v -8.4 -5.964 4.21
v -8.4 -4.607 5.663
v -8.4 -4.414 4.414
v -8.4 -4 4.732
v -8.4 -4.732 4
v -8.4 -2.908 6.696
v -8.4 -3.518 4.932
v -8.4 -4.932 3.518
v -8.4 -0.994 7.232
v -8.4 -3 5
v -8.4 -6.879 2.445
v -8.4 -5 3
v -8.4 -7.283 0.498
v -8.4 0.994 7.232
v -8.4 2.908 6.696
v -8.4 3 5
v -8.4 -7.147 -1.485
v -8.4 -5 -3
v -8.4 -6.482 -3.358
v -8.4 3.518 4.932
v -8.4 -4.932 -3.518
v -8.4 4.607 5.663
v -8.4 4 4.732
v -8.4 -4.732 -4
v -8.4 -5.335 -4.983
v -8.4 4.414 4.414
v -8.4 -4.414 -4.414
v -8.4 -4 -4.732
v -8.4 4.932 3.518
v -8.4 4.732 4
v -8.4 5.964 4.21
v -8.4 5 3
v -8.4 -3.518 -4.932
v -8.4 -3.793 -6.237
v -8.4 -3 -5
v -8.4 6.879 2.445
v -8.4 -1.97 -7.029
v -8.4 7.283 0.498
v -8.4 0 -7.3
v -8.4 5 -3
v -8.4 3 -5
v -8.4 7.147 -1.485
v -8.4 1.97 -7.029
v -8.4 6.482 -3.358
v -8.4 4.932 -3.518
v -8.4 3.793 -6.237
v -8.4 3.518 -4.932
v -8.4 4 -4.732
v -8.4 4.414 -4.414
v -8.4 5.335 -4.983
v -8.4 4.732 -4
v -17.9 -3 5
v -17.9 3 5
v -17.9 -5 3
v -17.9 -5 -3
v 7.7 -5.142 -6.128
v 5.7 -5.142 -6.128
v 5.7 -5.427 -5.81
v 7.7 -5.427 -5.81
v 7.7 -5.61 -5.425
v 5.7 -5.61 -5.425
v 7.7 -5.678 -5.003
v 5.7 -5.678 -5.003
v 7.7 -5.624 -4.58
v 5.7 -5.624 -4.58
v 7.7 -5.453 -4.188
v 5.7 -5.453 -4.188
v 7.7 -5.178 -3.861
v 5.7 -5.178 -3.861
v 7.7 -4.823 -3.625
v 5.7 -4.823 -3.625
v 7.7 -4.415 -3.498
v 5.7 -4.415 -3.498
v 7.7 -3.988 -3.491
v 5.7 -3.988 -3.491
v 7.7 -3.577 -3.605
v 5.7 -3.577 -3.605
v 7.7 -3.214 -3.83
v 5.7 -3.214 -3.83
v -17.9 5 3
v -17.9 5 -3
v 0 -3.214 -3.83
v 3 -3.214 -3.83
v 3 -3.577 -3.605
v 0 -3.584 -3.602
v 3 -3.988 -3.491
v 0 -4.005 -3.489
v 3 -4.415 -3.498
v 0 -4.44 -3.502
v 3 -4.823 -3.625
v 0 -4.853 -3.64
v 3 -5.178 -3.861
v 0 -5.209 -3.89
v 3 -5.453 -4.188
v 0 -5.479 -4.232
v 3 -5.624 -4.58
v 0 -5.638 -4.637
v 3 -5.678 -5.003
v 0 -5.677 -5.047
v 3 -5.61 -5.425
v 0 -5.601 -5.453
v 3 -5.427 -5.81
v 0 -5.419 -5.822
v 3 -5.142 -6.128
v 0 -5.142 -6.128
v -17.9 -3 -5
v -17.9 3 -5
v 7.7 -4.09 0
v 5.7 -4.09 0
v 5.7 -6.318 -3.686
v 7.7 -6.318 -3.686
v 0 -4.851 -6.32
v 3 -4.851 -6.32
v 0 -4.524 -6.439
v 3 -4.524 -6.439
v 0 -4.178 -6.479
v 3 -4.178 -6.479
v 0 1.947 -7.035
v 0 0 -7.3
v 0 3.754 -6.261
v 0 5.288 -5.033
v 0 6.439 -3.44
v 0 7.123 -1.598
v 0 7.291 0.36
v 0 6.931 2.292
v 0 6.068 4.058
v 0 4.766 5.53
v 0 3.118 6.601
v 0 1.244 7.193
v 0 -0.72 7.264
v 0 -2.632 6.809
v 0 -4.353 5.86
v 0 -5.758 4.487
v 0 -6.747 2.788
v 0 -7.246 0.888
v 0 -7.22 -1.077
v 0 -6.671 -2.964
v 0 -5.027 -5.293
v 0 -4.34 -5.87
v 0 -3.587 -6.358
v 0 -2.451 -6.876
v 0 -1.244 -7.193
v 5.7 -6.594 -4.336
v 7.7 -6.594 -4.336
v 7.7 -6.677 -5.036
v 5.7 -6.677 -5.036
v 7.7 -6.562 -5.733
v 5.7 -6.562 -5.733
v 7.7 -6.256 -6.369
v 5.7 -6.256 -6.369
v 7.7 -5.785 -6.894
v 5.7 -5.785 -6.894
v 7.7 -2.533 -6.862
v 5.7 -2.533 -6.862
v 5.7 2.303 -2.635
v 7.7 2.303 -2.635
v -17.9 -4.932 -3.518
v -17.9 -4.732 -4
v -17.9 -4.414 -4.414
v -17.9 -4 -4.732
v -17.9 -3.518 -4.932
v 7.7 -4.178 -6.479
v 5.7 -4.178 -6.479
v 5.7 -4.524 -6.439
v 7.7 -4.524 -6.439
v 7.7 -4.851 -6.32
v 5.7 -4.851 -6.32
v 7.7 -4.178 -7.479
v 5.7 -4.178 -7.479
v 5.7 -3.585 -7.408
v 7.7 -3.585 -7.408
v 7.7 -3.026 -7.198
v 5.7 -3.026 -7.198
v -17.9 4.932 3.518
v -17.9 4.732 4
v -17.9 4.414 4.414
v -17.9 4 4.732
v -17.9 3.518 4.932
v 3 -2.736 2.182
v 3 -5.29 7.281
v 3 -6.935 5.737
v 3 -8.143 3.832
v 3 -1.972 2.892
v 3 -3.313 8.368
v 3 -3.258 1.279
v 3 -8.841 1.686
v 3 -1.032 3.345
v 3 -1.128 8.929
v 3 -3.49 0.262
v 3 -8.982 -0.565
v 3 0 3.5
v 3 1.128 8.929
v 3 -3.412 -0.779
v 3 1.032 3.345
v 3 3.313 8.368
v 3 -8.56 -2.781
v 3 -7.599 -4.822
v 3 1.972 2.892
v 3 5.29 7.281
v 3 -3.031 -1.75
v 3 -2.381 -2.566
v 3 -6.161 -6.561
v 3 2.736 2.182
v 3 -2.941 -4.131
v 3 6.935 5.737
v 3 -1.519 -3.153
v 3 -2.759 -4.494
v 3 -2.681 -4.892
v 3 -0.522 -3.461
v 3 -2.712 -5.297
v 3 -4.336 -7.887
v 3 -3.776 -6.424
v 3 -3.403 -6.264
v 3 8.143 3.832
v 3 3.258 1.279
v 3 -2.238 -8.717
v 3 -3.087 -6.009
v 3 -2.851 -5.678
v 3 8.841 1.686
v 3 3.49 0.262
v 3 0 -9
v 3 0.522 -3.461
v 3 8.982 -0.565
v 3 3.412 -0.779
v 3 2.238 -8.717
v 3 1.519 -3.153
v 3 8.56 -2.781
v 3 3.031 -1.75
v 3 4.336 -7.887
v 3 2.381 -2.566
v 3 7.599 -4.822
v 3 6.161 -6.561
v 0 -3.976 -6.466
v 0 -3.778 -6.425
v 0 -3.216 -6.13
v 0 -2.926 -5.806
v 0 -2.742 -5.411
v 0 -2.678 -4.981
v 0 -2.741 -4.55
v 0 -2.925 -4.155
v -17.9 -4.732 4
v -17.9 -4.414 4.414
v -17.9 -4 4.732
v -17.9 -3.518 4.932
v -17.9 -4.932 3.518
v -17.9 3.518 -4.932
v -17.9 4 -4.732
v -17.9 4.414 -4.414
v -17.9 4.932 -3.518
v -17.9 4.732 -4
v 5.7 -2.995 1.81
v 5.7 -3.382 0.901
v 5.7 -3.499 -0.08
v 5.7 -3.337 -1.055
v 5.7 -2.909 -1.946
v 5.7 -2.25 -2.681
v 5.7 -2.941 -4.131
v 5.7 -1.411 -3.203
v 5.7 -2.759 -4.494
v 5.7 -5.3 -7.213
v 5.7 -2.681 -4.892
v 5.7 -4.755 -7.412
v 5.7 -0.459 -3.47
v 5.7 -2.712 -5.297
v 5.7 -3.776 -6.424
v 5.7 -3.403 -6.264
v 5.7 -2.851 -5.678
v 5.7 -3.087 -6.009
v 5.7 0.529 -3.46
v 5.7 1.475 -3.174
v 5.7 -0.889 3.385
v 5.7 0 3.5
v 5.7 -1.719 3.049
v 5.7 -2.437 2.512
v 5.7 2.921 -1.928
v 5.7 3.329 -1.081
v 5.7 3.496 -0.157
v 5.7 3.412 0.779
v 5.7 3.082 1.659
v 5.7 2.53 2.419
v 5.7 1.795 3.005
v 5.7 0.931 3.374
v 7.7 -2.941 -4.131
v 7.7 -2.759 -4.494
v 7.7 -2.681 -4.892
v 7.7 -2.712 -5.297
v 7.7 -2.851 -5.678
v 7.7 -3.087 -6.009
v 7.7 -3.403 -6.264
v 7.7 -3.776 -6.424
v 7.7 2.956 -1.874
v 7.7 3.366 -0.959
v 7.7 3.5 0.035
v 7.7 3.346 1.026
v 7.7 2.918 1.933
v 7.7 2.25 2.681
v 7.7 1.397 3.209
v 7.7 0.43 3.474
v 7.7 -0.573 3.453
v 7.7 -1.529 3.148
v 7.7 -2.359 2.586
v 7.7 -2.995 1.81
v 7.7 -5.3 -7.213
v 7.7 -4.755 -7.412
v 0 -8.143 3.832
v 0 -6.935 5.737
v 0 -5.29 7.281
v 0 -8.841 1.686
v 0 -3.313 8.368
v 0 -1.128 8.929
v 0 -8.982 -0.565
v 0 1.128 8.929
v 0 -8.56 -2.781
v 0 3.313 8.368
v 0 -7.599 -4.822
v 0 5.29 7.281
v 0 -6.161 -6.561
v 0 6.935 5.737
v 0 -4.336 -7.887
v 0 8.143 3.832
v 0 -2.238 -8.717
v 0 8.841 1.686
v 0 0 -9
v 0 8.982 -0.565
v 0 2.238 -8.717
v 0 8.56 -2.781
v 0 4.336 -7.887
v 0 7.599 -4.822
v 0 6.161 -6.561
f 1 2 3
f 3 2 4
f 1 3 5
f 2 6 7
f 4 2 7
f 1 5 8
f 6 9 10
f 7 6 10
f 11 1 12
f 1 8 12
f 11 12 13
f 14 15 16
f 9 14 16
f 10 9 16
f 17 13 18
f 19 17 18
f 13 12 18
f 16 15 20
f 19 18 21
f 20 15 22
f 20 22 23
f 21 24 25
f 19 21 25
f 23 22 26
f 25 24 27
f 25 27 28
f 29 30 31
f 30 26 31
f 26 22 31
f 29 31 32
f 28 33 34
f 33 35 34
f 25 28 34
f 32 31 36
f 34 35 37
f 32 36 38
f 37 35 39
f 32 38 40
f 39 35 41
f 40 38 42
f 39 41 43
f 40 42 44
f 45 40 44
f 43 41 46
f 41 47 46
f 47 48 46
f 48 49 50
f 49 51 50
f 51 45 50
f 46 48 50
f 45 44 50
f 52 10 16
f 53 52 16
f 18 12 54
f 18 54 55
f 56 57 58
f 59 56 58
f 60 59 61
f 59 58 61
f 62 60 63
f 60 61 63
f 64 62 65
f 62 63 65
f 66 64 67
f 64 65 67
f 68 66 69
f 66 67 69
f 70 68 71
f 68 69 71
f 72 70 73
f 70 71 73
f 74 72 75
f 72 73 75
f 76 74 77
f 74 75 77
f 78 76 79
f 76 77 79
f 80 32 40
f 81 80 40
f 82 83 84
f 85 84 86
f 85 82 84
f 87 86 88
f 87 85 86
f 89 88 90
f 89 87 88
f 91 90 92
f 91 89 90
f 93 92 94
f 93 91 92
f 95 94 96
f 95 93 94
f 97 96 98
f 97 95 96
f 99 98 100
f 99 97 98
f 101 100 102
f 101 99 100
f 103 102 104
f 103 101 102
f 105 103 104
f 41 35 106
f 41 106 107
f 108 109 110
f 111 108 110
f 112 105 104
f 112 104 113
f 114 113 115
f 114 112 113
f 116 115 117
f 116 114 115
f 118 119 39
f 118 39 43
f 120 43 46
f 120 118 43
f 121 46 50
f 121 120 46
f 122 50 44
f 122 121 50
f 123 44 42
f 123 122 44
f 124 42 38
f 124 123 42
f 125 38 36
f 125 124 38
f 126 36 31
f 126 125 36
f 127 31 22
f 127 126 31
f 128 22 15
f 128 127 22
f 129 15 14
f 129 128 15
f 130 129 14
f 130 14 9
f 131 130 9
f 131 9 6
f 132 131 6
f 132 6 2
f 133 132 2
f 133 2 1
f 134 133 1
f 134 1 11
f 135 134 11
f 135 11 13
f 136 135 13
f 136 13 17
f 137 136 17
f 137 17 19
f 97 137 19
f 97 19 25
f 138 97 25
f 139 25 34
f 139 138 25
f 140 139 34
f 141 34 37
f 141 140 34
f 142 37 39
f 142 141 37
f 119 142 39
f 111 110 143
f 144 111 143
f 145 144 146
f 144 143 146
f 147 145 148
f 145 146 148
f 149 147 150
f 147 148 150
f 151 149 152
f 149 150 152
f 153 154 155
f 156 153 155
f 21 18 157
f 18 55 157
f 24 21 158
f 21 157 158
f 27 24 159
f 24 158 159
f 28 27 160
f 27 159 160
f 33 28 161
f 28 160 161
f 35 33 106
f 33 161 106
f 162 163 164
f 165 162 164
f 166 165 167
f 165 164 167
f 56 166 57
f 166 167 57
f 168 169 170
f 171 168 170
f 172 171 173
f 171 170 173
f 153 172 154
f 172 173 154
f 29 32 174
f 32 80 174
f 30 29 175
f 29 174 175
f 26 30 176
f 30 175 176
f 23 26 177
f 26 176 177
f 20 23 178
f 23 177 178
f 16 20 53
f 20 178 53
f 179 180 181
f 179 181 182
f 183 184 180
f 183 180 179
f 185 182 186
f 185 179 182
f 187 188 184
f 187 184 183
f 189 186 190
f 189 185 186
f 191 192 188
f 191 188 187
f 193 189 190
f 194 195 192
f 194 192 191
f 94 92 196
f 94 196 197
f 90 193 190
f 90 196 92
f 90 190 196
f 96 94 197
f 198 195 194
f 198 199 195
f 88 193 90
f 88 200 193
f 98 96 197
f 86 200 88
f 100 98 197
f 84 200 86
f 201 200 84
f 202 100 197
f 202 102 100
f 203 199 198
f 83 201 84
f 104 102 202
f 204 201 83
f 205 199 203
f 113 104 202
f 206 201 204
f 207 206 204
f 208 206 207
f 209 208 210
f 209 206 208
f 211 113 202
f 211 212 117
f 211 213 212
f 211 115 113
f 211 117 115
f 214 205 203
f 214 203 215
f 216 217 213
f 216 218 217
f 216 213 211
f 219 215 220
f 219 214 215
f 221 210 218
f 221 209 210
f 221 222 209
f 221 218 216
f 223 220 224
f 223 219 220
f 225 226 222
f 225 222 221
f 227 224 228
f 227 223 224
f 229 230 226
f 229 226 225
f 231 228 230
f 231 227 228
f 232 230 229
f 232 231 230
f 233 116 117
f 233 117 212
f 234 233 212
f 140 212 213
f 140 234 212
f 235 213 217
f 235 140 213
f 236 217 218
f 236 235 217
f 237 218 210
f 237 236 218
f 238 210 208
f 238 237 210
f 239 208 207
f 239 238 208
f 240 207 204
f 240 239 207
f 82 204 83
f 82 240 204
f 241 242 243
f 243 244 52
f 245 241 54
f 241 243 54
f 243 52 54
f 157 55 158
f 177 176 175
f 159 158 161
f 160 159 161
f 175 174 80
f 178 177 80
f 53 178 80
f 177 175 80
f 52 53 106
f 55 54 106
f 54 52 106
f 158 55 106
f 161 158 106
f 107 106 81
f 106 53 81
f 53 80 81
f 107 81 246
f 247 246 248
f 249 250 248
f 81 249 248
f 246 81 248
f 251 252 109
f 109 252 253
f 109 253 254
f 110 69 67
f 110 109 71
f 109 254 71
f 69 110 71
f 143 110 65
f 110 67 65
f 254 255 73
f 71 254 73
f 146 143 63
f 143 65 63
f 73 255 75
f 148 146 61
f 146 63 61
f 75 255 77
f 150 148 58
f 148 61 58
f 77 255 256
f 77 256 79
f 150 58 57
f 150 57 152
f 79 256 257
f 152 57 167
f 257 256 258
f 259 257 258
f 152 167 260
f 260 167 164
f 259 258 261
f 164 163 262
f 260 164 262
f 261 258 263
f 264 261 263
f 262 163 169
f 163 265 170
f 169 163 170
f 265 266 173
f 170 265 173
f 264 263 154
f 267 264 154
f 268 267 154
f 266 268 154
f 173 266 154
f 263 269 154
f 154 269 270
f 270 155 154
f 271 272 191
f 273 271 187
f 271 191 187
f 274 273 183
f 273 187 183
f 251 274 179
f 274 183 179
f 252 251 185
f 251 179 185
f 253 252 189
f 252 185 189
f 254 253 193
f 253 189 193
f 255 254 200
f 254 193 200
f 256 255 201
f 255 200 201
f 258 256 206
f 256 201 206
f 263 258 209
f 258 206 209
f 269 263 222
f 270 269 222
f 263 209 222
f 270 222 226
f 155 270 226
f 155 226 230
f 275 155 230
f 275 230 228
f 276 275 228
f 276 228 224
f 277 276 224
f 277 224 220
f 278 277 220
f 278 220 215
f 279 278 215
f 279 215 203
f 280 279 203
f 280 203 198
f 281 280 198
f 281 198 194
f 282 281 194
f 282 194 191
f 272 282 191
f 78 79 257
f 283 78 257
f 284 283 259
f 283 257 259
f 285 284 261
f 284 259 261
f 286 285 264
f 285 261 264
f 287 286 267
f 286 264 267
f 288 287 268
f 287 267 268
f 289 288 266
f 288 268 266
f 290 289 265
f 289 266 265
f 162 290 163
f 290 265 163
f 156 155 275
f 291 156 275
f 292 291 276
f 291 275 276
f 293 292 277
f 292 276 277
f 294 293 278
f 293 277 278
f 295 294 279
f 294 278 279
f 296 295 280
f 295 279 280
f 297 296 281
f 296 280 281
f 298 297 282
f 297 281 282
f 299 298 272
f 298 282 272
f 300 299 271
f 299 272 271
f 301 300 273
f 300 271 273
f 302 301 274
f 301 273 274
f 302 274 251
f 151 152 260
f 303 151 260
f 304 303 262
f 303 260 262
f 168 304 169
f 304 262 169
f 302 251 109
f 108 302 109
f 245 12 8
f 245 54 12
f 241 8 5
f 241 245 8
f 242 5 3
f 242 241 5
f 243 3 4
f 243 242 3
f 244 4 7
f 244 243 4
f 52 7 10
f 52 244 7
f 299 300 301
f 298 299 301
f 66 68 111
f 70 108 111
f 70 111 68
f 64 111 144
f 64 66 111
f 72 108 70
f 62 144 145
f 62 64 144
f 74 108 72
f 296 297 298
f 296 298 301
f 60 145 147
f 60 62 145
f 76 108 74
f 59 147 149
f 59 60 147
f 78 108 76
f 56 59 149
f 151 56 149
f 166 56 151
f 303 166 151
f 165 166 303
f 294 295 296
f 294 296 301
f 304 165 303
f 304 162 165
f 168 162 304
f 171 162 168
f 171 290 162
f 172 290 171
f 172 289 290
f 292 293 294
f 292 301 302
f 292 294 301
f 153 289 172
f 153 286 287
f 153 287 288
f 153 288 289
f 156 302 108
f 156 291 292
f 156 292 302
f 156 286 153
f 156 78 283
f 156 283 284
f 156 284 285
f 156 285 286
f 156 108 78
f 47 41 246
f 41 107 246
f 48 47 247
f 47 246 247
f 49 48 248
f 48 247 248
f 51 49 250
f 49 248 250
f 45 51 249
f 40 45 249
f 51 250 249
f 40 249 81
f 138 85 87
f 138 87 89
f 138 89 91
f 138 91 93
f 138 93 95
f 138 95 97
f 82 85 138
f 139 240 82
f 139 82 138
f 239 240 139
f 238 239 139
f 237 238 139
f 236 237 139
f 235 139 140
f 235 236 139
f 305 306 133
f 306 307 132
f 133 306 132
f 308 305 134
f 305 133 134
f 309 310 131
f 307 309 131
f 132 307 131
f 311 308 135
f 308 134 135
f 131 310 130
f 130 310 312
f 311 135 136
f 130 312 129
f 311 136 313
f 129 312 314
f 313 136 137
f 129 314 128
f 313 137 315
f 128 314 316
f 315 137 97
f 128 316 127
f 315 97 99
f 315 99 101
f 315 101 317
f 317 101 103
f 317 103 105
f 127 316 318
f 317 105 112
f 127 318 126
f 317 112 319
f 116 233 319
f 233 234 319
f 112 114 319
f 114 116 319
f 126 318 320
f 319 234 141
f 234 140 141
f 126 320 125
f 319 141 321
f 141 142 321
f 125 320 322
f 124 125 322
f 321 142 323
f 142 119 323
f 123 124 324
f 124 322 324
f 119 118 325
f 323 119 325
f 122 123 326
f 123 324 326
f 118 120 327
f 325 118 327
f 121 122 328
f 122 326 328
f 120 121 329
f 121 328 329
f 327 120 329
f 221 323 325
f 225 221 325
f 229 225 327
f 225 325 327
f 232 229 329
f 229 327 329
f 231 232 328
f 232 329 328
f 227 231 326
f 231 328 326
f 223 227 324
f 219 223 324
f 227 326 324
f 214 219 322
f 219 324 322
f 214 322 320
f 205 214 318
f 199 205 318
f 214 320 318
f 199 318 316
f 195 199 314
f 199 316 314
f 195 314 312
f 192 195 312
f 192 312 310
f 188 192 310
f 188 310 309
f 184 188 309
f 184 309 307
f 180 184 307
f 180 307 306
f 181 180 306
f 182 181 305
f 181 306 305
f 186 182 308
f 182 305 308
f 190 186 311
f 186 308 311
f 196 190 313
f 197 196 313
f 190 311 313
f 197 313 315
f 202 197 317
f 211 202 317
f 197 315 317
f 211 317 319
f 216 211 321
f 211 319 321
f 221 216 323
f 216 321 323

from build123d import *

# Parameters (mm, degrees)
SKETCH2_R           = 9
BOSS_EXTRUDE1_DEPTH = 3
SKETCH2_4_R         = 7.3
BOSS_EXTRUDE2_DEPTH = 8.4
BOSS_EXTRUDE3_START = -8.4
SKETCH2_6_W         = 10
SKETCH2_6_H         = 10
BOSS_EXTRUDE3_DEPTH = 9.5
BOSS_EXTRUDE6_START = 3
SKETCH6_R           = 3.5
BOSS_EXTRUDE6_DEPTH = 2.7
BOSS_EXTRUDE7_START = 5.7
BOSS_EXTRUDE7_DEPTH = 2
CUT_EXTRUDE1_DEPTH  = 3
FILLET1_R           = 2


with BuildPart() as part:
    # Sketch2 → Boss-Extrude1 (new body)
    with BuildSketch(Plane(origin=(0, 0, 0), x_dir=(0, 0, -1), z_dir=(1, 0, 0))):
        Circle(SKETCH2_R)
    extrude(amount=BOSS_EXTRUDE1_DEPTH)

    # Sketch2<4> → Boss-Extrude2 (add)
    with BuildSketch(Plane(origin=(0, 0, 0), x_dir=(0, 0, -1), z_dir=(1, 0, 0))):
        Circle(SKETCH2_4_R)
    extrude(amount=-BOSS_EXTRUDE2_DEPTH)

    # Sketch2<6> → Boss-Extrude3 (add)
    with BuildSketch(Plane(origin=(0, 0, 0), x_dir=(0, 0, -1), z_dir=(1, 0, 0)).offset(BOSS_EXTRUDE3_START)):
        Rectangle(SKETCH2_6_W, SKETCH2_6_H)
    extrude(amount=-BOSS_EXTRUDE3_DEPTH)

    # Sketch6 → Boss-Extrude6 (add)
    with BuildSketch(Plane(origin=(0, 0, 0), x_dir=(0, 0, -1), z_dir=(1, 0, 0)).offset(BOSS_EXTRUDE6_START)):
        with Locations(Location((0, 0, 0), (0, 0, 180))):
            Circle(SKETCH6_R)
    extrude(amount=BOSS_EXTRUDE6_DEPTH)

    # Sketch6<4> → Boss-Extrude7 (add)
    with BuildSketch(Plane(origin=(0, 0, 0), x_dir=(0, 0, -1), z_dir=(1, 0, 0)).offset(BOSS_EXTRUDE7_START)):
        with BuildLine():
            ThreePointArc((6.861759117, -2.533034113), (4.954197643, -1.67824538), (3.064177772, -2.571150439))
            Line((3.064177772, -2.571150439), (3.830222216, -3.213938048))
            ThreePointArc((3.830222216, -3.213938048), (5.492319095, -2.768580532), (6.47928888, -4.178119463))
            ThreePointArc((6.47928888, -4.178119463), (6.388827811, -4.691149678), (6.128355545, -5.142300877))
            Line((6.128355545, -5.142300877), (6.894399988, -5.785088487))
            ThreePointArc((6.894399991, -5.785088484), (7.328520433, -5.033169819), (7.47928888, -4.178119463))
            ThreePointArc((7.47928888, -4.178119463), (7.3198204, -3.29953412), (6.861759117, -2.533034113))
        make_face()
        with BuildLine():
            Line((3.830222216, -3.213938048), (3.064177772, -2.571150439))
            ThreePointArc((3.064177772, -2.571150439), (2.513036454, -4.587507997), (3.6860836, -6.31765682))
            ThreePointArc((3.6860836, -6.31765682), (5.388677416, -6.644371889), (6.894399991, -5.785088484))
            Line((6.894399988, -5.785088487), (6.128355545, -5.142300877))
            ThreePointArc((6.128355545, -5.142300877), (4.015107466, -5.327186128), (3.830222216, -3.213938048))
        make_face()
        with BuildLine():
            ThreePointArc((3.5, 0), (3.288924173, -1.197070502), (2.681155551, -2.249756634))
            Line((2.681155551, -2.249756634), (3.064177772, -2.571150439))
            ThreePointArc((3.064177772, -2.571150439), (4.954197643, -1.67824538), (6.861759117, -2.533034113))
            Line((6.861759117, -2.533034113), (2.635458332, 2.303119489))
            ThreePointArc((2.635458332, 2.303119489), (3.276744128, 1.230019479), (3.5, 0))
        make_face()
        with BuildLine():
            Line((3.064177772, -2.571150439), (2.681155551, -2.249756634))
            ThreePointArc((2.681155551, -2.249756634), (1.479163916, -3.172077255), (0, -3.5))
            Line((0, -3.5), (0, -4.089669185))
            Line((0, -4.089669185), (3.6860836, -6.31765682))
            ThreePointArc((3.6860836, -6.31765682), (2.513036454, -4.587507997), (3.064177772, -2.571150439))
        make_face()
        with BuildLine():
            Line((0, -3.5), (0, 0))
            Line((0, 0), (2.681155551, -2.249756634))
            ThreePointArc((2.681155551, -2.249756634), (3.288924173, -1.197070502), (3.5, 0))
            ThreePointArc((3.5, 0), (3.276744128, 1.230019479), (2.635458332, 2.303119489))
            ThreePointArc((2.635458332, 2.303119489), (-2.681155551, 2.249756634), (-1.810487393, -2.9953523))
            ThreePointArc((-1.810487393, -2.9953523), (-0.939751816, -3.371478389), (0, -3.5))
        make_face()
        with BuildLine():
            Line((2.681155551, -2.249756634), (0, 0))
            Line((0, 0), (0, -3.5))
            ThreePointArc((0, -3.5), (1.479163916, -3.172077255), (2.681155551, -2.249756634))
        make_face()
        with BuildLine():
            Line((0, -4.089669185), (0, -3.5))
            ThreePointArc((0, -3.5), (-0.939751816, -3.371478389), (-1.810487393, -2.9953523))
            Line((-1.810487393, -2.9953523), (0, -4.089669185))
        make_face()
    extrude(amount=BOSS_EXTRUDE7_DEPTH)

    # Sketch6<5> → Cut-Extrude1 (cut)
    with BuildSketch(Plane(origin=(0, 0, 0), x_dir=(0, 0, -1), z_dir=(1, 0, 0))):
        with BuildLine():
            ThreePointArc((6.47928888, -4.178119463), (5.492319095, -2.768580532), (3.830222216, -3.213938048))
            Line((3.830222216, -3.213938048), (6.128355545, -5.142300877))
            ThreePointArc((6.128355545, -5.142300877), (6.388827811, -4.691149678), (6.47928888, -4.178119463))
        make_face()
        with BuildLine():
            Line((6.128355545, -5.142300877), (3.830222216, -3.213938048))
            ThreePointArc((3.830222216, -3.213938048), (4.015107466, -5.327186128), (6.128355545, -5.142300877))
        make_face()
    extrude(amount=CUT_EXTRUDE1_DEPTH, mode=Mode.SUBTRACT)

    # Fillet1
    fillet1_edges = [part.edges().sort_by_distance(p)[0] for p in [
        (-13.15, -5, 5),
        (-13.15, 5, 5),
        (-13.15, 5, -5),
        (-13.15, -5, -5),
    ]]
    fillet(fillet1_edges, radius=FILLET1_R)


solid = part.part
